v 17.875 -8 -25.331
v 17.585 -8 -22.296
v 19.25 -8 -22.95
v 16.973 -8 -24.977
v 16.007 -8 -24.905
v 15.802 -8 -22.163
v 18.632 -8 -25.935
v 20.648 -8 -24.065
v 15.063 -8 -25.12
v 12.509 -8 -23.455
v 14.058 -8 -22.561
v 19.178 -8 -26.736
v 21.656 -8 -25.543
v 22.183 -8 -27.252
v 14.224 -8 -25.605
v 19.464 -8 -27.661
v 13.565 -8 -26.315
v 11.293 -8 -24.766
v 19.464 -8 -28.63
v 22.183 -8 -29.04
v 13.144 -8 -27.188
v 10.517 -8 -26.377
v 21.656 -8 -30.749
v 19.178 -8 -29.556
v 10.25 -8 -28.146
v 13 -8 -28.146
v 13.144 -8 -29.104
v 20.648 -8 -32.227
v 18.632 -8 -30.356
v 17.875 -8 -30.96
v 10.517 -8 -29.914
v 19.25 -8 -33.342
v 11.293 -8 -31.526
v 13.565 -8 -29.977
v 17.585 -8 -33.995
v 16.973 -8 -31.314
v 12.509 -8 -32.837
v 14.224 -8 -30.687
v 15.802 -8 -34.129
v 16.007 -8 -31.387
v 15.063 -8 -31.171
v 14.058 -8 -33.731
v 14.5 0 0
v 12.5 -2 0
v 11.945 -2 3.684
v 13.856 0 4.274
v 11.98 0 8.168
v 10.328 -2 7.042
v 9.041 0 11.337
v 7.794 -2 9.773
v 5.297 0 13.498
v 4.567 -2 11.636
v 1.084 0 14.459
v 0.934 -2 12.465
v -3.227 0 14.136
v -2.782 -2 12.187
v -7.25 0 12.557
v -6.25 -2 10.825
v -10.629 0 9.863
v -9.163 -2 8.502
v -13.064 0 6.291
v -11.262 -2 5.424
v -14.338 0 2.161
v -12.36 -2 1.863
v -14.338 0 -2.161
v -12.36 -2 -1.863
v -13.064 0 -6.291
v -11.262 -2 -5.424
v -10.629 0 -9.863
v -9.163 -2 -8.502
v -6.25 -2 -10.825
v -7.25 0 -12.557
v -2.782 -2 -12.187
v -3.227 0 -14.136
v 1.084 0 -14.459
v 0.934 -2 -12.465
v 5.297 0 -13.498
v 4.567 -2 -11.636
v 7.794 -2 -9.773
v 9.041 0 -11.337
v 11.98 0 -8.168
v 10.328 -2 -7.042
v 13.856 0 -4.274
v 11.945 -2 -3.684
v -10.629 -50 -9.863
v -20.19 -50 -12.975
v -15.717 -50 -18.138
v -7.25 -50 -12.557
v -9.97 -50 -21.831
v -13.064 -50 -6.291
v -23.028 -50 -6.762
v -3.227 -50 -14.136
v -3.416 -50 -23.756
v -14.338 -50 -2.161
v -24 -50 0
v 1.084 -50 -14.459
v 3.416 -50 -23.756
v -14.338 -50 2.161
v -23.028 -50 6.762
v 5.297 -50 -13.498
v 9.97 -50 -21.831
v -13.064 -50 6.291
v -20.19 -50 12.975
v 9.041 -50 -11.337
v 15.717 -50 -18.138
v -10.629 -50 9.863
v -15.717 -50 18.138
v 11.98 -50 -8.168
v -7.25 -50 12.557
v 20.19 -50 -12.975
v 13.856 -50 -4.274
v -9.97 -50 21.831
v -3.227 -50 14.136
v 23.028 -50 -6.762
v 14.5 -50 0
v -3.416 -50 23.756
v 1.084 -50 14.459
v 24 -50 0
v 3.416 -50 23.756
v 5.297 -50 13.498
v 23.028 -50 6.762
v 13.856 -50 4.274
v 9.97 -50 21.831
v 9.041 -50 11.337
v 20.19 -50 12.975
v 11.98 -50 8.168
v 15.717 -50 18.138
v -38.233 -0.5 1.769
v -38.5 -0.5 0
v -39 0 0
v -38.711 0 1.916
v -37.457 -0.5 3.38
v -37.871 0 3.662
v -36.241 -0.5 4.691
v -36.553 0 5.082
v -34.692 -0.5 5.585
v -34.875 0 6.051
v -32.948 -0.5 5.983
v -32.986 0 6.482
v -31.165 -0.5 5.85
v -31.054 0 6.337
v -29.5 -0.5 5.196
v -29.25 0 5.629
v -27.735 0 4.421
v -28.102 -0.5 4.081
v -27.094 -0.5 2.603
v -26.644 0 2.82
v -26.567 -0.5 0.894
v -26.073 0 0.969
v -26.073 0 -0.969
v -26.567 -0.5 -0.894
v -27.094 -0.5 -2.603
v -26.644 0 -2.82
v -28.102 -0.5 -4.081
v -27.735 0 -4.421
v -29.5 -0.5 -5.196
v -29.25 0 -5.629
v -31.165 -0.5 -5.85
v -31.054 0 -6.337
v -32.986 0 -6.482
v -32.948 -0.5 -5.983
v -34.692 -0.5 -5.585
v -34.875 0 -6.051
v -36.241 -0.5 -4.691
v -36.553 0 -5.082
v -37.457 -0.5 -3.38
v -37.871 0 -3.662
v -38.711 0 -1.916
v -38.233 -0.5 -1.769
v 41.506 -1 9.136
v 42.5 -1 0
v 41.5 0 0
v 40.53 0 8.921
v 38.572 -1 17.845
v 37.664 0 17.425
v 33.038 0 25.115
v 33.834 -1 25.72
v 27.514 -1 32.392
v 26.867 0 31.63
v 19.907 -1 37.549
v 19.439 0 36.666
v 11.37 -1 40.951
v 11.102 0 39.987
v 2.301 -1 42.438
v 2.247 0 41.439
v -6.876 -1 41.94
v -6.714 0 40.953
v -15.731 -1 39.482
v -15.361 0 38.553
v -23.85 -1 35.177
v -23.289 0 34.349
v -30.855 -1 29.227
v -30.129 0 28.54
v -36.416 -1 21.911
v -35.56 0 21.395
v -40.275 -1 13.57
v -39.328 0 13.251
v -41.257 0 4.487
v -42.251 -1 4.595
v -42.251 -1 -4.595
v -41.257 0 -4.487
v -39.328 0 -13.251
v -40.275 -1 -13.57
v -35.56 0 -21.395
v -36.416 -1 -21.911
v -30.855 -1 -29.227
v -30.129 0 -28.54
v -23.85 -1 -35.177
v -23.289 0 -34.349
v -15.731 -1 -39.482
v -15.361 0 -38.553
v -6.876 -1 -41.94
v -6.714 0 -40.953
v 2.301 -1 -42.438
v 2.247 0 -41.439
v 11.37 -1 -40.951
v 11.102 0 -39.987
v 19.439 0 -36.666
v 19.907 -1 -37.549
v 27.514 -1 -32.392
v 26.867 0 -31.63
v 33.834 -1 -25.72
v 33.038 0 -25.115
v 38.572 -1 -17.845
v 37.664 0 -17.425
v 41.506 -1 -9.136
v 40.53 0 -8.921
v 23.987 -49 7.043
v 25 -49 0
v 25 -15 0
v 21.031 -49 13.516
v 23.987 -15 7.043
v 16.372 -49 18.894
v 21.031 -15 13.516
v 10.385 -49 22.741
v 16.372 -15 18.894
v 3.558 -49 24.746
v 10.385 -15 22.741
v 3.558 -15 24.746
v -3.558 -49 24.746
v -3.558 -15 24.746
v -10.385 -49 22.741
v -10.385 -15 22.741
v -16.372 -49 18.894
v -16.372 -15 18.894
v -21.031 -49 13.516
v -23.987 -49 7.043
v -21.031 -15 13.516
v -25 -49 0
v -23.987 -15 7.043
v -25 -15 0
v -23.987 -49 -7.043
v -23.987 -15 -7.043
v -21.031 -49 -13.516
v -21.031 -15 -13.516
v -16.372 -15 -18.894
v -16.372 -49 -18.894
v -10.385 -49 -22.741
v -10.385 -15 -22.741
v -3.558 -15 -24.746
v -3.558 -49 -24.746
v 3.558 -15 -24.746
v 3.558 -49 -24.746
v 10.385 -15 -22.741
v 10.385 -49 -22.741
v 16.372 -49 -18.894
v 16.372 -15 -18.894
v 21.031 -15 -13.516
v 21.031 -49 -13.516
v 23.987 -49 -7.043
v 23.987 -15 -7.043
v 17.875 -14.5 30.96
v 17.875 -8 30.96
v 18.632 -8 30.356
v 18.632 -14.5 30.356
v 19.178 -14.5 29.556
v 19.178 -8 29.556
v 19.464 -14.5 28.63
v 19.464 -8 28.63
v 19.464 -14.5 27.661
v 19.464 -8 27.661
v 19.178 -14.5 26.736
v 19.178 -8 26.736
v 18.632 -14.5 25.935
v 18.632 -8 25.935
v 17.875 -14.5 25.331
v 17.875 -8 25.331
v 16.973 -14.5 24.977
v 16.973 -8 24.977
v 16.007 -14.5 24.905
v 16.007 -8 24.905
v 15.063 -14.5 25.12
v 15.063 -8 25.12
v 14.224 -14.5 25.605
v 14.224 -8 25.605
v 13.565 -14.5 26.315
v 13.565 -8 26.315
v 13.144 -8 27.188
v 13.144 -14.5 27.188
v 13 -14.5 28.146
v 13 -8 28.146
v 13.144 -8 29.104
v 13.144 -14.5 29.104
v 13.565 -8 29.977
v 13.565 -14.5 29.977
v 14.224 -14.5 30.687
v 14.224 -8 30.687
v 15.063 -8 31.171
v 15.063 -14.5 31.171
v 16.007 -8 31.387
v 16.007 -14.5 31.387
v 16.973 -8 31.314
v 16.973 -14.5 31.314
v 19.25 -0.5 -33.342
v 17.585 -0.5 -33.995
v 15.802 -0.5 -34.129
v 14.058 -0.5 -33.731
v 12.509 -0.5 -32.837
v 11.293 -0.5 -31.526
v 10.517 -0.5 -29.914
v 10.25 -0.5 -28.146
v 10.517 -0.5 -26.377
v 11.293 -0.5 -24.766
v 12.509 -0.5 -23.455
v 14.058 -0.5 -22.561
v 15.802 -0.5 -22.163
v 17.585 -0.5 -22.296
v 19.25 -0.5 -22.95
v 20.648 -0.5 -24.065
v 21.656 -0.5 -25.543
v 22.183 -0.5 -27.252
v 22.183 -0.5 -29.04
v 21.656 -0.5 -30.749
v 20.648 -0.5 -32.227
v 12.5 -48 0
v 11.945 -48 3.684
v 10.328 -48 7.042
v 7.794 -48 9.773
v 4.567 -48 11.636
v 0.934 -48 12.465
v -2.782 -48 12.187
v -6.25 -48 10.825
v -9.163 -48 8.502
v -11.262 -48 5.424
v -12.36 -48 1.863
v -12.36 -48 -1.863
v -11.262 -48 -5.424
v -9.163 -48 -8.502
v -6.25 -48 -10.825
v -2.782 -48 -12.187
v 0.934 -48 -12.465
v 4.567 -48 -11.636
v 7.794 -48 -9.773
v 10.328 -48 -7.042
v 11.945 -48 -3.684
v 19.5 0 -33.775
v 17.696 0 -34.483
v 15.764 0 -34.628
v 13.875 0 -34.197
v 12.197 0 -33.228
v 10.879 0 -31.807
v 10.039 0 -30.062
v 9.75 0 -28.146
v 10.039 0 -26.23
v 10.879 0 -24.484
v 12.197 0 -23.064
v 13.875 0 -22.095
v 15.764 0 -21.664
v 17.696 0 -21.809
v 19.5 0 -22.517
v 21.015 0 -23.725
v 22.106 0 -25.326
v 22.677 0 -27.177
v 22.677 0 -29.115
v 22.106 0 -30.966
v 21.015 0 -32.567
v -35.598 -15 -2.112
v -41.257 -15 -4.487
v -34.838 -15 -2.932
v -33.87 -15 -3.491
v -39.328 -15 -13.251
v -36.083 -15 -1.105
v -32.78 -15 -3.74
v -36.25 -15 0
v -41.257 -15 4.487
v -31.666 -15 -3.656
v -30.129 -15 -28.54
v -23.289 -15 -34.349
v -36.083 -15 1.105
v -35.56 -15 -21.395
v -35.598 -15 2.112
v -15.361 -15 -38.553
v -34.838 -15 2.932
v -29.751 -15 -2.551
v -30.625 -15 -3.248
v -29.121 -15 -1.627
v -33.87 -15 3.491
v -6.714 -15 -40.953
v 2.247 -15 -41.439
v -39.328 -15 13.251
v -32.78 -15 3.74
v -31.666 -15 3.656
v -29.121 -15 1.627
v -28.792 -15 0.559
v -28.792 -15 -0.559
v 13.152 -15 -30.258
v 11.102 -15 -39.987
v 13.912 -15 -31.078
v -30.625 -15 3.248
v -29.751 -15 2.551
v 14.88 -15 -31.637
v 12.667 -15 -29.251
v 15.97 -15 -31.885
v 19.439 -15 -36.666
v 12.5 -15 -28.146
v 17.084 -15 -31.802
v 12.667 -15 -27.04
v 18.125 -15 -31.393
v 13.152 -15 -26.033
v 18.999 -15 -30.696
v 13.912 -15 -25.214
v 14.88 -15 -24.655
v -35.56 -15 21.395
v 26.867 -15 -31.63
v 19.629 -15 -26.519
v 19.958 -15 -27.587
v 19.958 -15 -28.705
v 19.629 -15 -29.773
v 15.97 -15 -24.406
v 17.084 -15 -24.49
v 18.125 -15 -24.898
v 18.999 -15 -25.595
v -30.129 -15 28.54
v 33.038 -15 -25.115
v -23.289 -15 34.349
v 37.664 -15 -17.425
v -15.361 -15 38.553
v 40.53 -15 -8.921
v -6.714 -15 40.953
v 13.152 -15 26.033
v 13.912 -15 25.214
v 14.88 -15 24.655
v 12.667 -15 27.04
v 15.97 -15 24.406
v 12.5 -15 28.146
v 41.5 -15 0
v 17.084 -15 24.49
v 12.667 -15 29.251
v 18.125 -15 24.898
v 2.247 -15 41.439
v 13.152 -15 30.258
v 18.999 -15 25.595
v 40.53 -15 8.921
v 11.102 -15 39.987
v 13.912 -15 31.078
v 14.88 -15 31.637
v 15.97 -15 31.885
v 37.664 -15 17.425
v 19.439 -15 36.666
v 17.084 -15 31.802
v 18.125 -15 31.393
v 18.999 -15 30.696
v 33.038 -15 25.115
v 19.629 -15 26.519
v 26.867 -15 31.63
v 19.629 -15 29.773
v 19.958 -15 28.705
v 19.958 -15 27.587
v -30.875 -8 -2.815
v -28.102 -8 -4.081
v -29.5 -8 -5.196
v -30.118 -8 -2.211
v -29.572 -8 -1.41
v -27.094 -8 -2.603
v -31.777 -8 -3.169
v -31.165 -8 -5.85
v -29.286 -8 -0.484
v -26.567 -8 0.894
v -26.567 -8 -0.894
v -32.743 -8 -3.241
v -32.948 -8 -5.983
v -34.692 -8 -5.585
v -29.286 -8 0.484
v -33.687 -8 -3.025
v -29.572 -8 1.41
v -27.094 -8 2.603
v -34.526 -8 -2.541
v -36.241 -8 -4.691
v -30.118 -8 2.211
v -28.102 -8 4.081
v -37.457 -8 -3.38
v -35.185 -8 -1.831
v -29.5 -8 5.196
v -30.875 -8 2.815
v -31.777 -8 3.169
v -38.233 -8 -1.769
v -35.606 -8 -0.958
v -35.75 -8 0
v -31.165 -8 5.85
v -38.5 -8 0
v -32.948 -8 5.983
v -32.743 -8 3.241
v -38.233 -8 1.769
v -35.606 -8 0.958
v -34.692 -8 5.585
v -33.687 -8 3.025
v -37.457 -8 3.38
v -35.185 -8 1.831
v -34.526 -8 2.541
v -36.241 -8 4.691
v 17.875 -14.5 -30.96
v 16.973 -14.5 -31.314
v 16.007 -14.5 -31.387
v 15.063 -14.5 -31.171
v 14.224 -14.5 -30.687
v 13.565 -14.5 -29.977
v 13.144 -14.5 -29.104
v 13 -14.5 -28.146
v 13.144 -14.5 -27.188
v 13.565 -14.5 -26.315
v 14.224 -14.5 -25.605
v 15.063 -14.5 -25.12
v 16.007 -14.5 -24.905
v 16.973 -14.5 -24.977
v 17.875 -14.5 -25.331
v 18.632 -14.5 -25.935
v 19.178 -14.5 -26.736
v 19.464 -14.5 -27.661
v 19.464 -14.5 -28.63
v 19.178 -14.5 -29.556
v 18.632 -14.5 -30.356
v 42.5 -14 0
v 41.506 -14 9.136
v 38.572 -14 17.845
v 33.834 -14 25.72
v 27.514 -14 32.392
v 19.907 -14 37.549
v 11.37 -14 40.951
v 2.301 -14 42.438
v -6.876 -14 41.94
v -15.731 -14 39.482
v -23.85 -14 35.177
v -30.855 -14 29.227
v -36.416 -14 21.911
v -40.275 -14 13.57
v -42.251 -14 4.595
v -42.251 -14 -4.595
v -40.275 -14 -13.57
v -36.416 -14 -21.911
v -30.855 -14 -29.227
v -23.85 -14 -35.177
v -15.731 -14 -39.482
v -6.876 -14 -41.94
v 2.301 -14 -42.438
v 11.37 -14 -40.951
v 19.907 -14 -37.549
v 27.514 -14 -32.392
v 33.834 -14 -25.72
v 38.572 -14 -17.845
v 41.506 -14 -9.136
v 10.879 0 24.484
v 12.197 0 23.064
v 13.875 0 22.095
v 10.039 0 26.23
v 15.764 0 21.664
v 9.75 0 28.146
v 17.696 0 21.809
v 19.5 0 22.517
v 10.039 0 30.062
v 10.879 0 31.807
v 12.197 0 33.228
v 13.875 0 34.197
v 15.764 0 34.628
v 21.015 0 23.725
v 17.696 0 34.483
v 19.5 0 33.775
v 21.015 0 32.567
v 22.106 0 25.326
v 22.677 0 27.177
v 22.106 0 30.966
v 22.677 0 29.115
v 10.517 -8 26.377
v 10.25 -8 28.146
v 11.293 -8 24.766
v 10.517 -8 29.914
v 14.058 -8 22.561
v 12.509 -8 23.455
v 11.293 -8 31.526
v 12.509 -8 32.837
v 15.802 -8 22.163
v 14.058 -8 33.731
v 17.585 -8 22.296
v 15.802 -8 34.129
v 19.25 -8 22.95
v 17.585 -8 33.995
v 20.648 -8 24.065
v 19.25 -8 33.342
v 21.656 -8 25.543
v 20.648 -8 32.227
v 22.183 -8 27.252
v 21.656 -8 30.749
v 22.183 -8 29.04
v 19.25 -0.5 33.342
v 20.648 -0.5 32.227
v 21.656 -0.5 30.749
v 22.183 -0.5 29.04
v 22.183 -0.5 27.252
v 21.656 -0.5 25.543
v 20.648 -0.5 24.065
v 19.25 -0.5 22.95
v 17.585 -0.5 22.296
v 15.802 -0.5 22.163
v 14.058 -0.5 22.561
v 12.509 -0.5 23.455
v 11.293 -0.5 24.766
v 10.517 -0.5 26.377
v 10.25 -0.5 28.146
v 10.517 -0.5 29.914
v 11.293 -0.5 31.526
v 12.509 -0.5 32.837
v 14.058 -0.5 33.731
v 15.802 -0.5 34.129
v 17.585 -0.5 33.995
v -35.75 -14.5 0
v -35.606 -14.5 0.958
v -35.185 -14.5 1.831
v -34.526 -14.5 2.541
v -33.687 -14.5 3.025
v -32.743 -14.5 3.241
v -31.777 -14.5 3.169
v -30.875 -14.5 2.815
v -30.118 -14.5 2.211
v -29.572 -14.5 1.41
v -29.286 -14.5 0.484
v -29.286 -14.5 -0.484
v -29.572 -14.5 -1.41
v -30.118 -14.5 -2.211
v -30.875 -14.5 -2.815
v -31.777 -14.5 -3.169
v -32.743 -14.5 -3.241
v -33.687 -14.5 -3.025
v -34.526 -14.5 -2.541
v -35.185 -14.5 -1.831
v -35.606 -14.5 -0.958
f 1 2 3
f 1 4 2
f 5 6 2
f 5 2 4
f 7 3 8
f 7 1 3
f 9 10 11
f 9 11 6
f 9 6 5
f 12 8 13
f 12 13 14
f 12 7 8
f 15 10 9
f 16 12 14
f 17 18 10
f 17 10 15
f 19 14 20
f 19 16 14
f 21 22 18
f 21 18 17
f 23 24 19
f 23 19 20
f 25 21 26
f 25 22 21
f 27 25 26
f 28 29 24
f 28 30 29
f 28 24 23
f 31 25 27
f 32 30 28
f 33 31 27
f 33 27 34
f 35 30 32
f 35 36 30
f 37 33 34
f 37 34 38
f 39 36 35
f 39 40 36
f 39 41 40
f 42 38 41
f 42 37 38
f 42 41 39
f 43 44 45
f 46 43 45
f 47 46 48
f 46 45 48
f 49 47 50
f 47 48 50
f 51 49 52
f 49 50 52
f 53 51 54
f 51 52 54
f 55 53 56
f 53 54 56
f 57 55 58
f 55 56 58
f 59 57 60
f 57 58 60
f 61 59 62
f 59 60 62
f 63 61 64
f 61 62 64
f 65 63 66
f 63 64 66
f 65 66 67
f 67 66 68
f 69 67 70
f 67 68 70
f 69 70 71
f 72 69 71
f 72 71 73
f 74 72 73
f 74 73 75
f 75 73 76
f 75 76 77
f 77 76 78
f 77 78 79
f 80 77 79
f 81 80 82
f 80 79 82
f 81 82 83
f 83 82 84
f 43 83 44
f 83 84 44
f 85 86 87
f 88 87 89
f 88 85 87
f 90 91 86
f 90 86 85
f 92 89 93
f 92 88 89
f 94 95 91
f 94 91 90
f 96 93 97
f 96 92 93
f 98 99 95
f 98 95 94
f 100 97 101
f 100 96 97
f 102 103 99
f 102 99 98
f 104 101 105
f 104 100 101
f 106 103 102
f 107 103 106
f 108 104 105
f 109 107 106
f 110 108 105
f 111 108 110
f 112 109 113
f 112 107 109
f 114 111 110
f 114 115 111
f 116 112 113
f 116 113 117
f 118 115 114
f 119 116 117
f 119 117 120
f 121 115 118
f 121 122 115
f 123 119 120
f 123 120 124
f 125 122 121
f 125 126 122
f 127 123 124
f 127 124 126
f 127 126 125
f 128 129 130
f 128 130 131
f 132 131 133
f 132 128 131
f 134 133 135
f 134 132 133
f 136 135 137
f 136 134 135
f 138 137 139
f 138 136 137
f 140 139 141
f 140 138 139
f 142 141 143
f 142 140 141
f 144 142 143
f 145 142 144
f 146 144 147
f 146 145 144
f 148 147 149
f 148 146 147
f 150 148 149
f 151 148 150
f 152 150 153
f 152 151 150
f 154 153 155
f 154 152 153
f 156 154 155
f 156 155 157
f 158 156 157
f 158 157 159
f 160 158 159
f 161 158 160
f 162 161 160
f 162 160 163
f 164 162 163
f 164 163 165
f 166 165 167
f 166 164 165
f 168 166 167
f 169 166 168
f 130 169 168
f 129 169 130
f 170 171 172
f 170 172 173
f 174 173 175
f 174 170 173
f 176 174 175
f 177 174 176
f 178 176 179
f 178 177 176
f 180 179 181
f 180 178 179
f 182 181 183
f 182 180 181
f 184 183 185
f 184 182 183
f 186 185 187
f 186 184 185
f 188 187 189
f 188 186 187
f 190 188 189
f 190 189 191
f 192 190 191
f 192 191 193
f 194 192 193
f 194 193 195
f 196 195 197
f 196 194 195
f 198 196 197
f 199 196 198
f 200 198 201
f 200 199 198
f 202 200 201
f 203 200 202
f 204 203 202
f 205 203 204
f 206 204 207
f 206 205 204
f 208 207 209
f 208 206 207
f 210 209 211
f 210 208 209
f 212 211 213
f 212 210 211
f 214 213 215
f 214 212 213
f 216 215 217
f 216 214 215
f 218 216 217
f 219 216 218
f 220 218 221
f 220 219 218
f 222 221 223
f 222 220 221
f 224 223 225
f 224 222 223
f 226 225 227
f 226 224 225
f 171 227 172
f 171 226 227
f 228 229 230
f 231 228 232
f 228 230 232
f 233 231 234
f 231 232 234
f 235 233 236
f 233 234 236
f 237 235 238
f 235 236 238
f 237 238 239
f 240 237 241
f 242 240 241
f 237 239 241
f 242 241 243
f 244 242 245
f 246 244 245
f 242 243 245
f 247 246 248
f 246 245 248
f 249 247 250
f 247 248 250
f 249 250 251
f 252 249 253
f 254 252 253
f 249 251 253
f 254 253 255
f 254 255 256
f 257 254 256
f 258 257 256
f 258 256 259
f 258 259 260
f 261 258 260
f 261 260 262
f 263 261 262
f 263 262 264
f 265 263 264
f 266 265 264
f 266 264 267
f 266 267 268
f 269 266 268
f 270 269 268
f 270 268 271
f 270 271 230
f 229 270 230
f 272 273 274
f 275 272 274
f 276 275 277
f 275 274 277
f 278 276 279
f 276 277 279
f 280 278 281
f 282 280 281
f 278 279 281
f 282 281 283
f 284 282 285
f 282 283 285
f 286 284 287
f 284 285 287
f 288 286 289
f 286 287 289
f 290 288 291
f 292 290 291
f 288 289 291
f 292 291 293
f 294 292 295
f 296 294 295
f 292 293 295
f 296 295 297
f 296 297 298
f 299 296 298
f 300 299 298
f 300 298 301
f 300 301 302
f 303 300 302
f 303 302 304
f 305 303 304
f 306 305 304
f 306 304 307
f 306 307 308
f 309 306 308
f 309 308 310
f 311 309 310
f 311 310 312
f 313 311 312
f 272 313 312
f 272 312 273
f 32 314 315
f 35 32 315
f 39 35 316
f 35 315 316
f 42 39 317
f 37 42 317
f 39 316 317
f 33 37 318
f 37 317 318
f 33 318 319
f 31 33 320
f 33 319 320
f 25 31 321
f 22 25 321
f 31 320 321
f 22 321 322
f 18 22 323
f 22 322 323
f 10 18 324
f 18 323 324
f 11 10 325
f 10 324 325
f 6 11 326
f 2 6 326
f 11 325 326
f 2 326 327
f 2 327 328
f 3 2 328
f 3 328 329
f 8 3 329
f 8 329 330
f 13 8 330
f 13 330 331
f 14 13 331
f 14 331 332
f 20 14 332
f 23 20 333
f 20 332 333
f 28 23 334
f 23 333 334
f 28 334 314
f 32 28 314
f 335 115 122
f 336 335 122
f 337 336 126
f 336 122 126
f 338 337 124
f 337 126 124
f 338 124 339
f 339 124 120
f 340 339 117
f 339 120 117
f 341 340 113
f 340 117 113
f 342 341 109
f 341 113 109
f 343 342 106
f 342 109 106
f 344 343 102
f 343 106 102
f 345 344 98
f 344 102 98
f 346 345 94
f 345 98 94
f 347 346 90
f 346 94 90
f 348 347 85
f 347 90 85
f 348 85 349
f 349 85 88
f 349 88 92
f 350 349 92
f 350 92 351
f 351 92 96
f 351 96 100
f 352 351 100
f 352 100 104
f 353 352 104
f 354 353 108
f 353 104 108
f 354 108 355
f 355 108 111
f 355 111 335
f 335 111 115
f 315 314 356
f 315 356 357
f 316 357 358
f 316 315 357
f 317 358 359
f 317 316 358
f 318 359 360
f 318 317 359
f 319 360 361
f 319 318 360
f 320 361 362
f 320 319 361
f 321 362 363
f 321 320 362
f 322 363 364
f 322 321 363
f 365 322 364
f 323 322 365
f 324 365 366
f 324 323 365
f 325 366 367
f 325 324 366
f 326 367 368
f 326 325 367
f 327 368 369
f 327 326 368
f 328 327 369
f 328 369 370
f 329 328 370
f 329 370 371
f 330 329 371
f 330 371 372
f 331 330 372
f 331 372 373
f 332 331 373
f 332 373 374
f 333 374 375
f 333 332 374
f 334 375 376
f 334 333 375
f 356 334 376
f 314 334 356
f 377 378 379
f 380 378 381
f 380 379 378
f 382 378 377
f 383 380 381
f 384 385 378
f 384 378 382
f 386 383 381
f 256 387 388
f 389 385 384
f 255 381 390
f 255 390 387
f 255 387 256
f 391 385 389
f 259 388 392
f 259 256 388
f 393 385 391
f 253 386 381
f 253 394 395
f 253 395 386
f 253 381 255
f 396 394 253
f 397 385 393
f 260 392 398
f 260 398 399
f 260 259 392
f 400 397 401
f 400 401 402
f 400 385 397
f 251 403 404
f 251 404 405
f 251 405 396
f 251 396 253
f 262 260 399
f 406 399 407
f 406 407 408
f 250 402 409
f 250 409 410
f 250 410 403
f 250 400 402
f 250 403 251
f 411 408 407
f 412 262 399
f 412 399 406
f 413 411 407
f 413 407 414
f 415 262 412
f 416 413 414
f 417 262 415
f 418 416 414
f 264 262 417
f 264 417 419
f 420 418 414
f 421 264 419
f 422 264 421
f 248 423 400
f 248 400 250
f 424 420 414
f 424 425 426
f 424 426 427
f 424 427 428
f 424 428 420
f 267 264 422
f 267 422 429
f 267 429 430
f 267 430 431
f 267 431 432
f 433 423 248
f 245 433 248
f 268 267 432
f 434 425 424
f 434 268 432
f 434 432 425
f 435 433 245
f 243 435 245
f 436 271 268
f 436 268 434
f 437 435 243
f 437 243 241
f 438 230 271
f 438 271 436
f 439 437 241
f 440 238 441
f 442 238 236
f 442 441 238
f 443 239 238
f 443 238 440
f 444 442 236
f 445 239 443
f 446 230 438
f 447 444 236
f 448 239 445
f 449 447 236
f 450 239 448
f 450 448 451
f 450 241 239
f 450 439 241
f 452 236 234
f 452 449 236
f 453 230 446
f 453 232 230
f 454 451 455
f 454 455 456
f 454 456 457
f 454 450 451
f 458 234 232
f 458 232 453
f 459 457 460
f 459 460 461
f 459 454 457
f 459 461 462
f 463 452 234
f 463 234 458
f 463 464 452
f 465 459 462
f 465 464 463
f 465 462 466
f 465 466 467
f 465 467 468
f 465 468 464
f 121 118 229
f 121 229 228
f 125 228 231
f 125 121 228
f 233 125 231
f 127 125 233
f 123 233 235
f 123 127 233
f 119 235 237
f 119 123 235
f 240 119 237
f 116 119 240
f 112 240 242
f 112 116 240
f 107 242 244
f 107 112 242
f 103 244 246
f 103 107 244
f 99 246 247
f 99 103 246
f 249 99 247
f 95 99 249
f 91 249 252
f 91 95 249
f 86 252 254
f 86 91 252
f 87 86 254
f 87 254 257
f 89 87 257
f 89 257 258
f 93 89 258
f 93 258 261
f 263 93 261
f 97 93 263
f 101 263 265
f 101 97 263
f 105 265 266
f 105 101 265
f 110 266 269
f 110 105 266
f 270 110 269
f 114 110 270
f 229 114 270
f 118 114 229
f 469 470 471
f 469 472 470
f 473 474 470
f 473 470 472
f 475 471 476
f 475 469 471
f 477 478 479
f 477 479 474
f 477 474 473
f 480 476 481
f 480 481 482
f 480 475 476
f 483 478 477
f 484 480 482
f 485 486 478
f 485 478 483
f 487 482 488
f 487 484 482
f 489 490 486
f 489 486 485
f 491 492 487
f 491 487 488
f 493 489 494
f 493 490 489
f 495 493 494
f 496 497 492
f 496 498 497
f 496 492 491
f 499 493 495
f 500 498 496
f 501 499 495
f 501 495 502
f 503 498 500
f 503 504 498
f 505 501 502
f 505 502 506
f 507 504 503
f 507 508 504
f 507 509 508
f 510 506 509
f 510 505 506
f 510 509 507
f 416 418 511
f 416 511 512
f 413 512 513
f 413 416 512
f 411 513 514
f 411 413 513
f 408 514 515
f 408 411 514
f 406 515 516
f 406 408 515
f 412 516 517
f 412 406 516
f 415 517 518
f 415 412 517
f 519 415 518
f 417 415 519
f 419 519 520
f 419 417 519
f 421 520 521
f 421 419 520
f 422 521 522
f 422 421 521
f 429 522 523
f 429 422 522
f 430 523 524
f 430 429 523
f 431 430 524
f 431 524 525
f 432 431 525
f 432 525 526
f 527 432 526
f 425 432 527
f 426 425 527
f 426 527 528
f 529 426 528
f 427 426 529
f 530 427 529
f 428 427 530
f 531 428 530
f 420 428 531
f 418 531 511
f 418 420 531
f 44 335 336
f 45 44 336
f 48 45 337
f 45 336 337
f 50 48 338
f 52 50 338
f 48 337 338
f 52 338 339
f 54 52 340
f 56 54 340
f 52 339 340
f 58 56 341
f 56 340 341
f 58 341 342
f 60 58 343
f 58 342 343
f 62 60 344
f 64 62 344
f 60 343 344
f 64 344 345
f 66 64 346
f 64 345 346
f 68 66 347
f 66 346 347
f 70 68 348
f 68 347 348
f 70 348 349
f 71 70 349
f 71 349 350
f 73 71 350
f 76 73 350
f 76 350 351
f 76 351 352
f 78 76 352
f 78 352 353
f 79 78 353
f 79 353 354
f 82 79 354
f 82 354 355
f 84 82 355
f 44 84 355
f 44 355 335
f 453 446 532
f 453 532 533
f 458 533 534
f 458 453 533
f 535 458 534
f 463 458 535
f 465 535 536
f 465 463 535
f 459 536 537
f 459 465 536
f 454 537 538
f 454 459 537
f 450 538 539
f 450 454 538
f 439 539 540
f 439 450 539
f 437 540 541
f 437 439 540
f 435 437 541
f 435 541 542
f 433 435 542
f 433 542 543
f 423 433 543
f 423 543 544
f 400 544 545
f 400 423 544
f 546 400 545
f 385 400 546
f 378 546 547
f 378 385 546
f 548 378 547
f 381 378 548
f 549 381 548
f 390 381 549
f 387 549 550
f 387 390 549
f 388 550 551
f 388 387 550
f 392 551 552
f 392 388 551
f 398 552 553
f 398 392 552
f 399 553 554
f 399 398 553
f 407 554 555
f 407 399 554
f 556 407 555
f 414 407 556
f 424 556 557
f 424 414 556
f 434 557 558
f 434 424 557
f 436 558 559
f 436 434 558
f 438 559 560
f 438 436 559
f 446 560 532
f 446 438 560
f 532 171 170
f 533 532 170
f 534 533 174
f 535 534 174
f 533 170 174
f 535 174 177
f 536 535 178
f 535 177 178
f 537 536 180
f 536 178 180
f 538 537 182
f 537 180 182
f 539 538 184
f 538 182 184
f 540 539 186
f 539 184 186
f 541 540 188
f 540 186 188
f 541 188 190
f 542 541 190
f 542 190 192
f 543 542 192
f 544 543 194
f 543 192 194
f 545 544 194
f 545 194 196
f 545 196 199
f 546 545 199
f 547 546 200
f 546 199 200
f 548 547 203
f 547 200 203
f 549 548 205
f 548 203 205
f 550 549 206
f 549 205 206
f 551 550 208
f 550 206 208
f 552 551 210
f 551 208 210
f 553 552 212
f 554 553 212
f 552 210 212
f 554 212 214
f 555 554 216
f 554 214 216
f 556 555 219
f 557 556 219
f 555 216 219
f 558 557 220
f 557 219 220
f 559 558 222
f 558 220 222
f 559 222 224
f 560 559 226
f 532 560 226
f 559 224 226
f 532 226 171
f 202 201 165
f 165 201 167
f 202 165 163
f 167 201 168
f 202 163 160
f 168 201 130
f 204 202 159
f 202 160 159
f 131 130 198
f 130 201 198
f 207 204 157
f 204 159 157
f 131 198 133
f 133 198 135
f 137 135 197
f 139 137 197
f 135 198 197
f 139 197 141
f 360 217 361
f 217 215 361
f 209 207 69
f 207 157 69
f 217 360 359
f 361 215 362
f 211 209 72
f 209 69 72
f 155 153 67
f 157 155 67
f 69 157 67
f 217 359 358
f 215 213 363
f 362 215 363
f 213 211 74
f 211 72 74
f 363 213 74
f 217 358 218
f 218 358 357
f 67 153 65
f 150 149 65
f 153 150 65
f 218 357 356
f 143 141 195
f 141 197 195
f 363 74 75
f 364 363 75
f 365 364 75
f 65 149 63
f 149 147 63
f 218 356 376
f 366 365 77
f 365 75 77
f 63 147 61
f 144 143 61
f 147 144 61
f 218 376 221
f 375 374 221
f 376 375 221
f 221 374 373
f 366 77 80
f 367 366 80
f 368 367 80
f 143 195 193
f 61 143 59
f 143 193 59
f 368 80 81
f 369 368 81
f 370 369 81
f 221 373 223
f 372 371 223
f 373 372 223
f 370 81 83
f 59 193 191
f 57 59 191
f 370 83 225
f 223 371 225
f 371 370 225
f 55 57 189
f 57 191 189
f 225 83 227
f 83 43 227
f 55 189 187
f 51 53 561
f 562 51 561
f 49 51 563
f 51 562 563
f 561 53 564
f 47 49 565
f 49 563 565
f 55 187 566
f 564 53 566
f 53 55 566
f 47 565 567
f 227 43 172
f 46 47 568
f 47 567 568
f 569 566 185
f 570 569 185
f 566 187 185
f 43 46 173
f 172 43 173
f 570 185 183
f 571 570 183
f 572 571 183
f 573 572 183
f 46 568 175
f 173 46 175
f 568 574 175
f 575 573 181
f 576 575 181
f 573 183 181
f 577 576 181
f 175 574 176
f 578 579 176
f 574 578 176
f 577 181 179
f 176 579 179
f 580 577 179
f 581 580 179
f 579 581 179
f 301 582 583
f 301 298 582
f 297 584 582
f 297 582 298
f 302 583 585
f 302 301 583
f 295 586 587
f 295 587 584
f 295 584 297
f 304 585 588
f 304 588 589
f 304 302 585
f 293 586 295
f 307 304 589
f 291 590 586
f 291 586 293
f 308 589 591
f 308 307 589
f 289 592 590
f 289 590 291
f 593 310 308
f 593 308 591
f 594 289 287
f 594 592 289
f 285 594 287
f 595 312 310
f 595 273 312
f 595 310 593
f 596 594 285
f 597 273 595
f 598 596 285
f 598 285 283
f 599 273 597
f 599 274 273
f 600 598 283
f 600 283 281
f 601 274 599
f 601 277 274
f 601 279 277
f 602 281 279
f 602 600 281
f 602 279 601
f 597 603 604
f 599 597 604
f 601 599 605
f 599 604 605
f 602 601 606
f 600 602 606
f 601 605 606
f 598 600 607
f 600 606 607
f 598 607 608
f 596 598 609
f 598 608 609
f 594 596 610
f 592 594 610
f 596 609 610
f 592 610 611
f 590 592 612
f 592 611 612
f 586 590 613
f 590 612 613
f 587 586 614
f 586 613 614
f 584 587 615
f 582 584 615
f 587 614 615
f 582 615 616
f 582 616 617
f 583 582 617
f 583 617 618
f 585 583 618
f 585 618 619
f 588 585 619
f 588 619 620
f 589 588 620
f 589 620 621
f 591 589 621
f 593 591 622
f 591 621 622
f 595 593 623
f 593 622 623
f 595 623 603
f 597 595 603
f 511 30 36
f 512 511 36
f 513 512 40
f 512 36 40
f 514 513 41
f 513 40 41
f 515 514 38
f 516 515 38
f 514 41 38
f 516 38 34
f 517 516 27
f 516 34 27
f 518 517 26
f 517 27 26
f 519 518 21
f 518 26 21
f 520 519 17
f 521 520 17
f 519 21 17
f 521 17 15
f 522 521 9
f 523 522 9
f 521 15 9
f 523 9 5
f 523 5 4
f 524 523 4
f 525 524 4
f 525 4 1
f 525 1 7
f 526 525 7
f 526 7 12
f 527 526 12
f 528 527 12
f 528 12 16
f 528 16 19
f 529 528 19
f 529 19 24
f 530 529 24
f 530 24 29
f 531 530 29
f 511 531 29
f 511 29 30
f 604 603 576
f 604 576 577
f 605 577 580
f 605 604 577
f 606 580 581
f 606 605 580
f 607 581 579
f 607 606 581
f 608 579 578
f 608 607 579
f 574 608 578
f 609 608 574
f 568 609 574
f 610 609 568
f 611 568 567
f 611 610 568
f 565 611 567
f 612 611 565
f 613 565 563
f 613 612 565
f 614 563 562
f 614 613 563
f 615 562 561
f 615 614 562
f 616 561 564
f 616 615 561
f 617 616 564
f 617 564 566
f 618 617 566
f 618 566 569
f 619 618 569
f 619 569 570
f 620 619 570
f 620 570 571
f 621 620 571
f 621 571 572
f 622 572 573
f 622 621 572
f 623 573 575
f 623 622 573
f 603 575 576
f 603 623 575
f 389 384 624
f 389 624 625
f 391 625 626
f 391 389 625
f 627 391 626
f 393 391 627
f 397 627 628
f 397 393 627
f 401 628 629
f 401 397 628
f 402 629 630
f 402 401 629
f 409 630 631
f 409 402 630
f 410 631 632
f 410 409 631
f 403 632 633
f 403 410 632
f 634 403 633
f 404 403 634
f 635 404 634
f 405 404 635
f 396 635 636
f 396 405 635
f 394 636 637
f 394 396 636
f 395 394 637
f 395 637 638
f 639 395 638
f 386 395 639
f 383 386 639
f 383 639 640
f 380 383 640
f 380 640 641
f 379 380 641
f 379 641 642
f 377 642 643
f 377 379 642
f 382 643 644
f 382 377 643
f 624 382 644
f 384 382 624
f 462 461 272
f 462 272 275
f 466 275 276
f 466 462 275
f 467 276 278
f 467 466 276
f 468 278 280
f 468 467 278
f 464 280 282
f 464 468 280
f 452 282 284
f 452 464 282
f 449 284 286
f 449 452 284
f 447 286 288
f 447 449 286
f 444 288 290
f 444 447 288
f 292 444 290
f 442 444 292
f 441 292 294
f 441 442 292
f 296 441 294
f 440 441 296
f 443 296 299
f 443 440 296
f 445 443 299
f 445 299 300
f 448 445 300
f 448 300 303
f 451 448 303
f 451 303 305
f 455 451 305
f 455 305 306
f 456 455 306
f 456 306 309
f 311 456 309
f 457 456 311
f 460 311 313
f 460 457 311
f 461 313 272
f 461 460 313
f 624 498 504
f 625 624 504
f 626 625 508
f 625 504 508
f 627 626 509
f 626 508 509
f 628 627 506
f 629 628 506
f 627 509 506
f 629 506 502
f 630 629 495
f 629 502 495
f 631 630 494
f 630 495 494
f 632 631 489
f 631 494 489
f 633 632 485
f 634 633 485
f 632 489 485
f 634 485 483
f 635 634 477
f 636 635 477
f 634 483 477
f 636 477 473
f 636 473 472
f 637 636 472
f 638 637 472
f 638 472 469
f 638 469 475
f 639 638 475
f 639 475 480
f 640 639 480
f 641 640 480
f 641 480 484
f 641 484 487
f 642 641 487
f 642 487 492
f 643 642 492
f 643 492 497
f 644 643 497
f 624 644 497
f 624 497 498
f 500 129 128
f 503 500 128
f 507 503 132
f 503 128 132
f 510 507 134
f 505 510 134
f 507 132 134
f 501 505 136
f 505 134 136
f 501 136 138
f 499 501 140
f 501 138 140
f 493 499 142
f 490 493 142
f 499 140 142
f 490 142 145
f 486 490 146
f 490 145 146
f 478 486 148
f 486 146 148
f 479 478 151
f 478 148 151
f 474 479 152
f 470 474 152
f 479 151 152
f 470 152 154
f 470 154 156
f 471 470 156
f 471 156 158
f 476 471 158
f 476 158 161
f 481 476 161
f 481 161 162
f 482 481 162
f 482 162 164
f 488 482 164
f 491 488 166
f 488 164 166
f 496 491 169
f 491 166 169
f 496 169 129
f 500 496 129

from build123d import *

# Parameters (mm, degrees)
F0_R            = 42.5
F0_R_2          = 25
F1_DEPTH        = 15
F2_DEPTH        = 50
F3_SIZE         = 1
F4_R            = 12.5
F5_DEPTH        = 50.001
F6_SIZE         = 2
F7_R            = 3.25
F8_DEPTH        = 50.001
F8_COPIES_COUNT = 3
F7_R_2          = 6
F9_DEPTH        = 8
F9_COPIES_COUNT = 3
F10_SIZE        = 0.5


# Not quite as in the source:
# - a pattern or mirror of a feature is missing from the dataset's text; its kind, count and spacing are read off the source's solid


with BuildPart() as f1:
    # F0 (on Front) → F1 (new body)
    with BuildSketch(Plane.XZ):
        Circle(F0_R)
        Circle(F0_R_2, mode=Mode.SUBTRACT)
        Circle(F0_R_2)
    extrude(amount=F1_DEPTH)

    # F0 (on Front) → F2 (join)
    with BuildSketch(Plane.XZ):
        Circle(F0_R_2)
    extrude(amount=F2_DEPTH)

    # F3
    f3_edges = [f1.edges().sort_by_distance(p)[0] for p in [
        (-42.5, 0, 0),
        (-42.5, -15, 0),
        (-25, -50, 0),
    ]]
    chamfer(f3_edges, length=F3_SIZE)

    # F4 (on face) → F5 (cut, through all)
    with BuildSketch(Plane.XZ.offset(50)):
        Circle(F4_R)
    extrude(amount=-F5_DEPTH, mode=Mode.SUBTRACT)

    # F6
    f6_edges = [f1.edges().sort_by_distance(p)[0] for p in [
        (-12.5, -50, 0),
        (-12.5, 0, 0),
    ]]
    chamfer(f6_edges, length=F6_SIZE)

    # F7 (on face) → F8 (cut, through all)
    with BuildSketch(Plane(origin=(0, 0, 0), x_dir=(-1, 0, 0), z_dir=(0, 1, 0))):
        with Locations((32.5, 0)):
            Circle(F7_R)
    f8 = extrude(amount=-F8_DEPTH, mode=Mode.SUBTRACT)

    # F8_copies: F8 ×3 about axis
    f8_copies_axis = Axis((0, 0, 0), (0, 1, 0))
    for i in range(1, F8_COPIES_COUNT):
        add(f8.rotate(f8_copies_axis, i * 360 / F8_COPIES_COUNT), mode=Mode.SUBTRACT)

    # F7 (on face) → F9 (cut)
    with BuildSketch(Plane(origin=(0, 0, 0), x_dir=(-1, 0, 0), z_dir=(0, 1, 0))):
        with Locations((32.5, 0)):
            Circle(F7_R_2)
        with Locations((32.5, 0)):
            Circle(F7_R, mode=Mode.SUBTRACT)
    f9 = extrude(amount=-F9_DEPTH, mode=Mode.SUBTRACT)

    # F9_copies: F9 ×3 about axis
    f9_copies_axis = Axis((0, 0, 0), (0, 1, 0))
    for i in range(1, F9_COPIES_COUNT):
        add(f9.rotate(f9_copies_axis, i * 360 / F9_COPIES_COUNT), mode=Mode.SUBTRACT)

    # F10
    f10_edges = [f1.edges().sort_by_distance(p)[0] for p in [
        (-26.5, 0, 0),
        (-29.25, -15, 0),
        (13.25, 0, -22.949673),
        (13.25, 0, 22.949673),
        (14.625, -15, -25.331243),
        (14.625, -15, 25.331243),
    ]]
    chamfer(f10_edges, length=F10_SIZE)


solid = f1.part
